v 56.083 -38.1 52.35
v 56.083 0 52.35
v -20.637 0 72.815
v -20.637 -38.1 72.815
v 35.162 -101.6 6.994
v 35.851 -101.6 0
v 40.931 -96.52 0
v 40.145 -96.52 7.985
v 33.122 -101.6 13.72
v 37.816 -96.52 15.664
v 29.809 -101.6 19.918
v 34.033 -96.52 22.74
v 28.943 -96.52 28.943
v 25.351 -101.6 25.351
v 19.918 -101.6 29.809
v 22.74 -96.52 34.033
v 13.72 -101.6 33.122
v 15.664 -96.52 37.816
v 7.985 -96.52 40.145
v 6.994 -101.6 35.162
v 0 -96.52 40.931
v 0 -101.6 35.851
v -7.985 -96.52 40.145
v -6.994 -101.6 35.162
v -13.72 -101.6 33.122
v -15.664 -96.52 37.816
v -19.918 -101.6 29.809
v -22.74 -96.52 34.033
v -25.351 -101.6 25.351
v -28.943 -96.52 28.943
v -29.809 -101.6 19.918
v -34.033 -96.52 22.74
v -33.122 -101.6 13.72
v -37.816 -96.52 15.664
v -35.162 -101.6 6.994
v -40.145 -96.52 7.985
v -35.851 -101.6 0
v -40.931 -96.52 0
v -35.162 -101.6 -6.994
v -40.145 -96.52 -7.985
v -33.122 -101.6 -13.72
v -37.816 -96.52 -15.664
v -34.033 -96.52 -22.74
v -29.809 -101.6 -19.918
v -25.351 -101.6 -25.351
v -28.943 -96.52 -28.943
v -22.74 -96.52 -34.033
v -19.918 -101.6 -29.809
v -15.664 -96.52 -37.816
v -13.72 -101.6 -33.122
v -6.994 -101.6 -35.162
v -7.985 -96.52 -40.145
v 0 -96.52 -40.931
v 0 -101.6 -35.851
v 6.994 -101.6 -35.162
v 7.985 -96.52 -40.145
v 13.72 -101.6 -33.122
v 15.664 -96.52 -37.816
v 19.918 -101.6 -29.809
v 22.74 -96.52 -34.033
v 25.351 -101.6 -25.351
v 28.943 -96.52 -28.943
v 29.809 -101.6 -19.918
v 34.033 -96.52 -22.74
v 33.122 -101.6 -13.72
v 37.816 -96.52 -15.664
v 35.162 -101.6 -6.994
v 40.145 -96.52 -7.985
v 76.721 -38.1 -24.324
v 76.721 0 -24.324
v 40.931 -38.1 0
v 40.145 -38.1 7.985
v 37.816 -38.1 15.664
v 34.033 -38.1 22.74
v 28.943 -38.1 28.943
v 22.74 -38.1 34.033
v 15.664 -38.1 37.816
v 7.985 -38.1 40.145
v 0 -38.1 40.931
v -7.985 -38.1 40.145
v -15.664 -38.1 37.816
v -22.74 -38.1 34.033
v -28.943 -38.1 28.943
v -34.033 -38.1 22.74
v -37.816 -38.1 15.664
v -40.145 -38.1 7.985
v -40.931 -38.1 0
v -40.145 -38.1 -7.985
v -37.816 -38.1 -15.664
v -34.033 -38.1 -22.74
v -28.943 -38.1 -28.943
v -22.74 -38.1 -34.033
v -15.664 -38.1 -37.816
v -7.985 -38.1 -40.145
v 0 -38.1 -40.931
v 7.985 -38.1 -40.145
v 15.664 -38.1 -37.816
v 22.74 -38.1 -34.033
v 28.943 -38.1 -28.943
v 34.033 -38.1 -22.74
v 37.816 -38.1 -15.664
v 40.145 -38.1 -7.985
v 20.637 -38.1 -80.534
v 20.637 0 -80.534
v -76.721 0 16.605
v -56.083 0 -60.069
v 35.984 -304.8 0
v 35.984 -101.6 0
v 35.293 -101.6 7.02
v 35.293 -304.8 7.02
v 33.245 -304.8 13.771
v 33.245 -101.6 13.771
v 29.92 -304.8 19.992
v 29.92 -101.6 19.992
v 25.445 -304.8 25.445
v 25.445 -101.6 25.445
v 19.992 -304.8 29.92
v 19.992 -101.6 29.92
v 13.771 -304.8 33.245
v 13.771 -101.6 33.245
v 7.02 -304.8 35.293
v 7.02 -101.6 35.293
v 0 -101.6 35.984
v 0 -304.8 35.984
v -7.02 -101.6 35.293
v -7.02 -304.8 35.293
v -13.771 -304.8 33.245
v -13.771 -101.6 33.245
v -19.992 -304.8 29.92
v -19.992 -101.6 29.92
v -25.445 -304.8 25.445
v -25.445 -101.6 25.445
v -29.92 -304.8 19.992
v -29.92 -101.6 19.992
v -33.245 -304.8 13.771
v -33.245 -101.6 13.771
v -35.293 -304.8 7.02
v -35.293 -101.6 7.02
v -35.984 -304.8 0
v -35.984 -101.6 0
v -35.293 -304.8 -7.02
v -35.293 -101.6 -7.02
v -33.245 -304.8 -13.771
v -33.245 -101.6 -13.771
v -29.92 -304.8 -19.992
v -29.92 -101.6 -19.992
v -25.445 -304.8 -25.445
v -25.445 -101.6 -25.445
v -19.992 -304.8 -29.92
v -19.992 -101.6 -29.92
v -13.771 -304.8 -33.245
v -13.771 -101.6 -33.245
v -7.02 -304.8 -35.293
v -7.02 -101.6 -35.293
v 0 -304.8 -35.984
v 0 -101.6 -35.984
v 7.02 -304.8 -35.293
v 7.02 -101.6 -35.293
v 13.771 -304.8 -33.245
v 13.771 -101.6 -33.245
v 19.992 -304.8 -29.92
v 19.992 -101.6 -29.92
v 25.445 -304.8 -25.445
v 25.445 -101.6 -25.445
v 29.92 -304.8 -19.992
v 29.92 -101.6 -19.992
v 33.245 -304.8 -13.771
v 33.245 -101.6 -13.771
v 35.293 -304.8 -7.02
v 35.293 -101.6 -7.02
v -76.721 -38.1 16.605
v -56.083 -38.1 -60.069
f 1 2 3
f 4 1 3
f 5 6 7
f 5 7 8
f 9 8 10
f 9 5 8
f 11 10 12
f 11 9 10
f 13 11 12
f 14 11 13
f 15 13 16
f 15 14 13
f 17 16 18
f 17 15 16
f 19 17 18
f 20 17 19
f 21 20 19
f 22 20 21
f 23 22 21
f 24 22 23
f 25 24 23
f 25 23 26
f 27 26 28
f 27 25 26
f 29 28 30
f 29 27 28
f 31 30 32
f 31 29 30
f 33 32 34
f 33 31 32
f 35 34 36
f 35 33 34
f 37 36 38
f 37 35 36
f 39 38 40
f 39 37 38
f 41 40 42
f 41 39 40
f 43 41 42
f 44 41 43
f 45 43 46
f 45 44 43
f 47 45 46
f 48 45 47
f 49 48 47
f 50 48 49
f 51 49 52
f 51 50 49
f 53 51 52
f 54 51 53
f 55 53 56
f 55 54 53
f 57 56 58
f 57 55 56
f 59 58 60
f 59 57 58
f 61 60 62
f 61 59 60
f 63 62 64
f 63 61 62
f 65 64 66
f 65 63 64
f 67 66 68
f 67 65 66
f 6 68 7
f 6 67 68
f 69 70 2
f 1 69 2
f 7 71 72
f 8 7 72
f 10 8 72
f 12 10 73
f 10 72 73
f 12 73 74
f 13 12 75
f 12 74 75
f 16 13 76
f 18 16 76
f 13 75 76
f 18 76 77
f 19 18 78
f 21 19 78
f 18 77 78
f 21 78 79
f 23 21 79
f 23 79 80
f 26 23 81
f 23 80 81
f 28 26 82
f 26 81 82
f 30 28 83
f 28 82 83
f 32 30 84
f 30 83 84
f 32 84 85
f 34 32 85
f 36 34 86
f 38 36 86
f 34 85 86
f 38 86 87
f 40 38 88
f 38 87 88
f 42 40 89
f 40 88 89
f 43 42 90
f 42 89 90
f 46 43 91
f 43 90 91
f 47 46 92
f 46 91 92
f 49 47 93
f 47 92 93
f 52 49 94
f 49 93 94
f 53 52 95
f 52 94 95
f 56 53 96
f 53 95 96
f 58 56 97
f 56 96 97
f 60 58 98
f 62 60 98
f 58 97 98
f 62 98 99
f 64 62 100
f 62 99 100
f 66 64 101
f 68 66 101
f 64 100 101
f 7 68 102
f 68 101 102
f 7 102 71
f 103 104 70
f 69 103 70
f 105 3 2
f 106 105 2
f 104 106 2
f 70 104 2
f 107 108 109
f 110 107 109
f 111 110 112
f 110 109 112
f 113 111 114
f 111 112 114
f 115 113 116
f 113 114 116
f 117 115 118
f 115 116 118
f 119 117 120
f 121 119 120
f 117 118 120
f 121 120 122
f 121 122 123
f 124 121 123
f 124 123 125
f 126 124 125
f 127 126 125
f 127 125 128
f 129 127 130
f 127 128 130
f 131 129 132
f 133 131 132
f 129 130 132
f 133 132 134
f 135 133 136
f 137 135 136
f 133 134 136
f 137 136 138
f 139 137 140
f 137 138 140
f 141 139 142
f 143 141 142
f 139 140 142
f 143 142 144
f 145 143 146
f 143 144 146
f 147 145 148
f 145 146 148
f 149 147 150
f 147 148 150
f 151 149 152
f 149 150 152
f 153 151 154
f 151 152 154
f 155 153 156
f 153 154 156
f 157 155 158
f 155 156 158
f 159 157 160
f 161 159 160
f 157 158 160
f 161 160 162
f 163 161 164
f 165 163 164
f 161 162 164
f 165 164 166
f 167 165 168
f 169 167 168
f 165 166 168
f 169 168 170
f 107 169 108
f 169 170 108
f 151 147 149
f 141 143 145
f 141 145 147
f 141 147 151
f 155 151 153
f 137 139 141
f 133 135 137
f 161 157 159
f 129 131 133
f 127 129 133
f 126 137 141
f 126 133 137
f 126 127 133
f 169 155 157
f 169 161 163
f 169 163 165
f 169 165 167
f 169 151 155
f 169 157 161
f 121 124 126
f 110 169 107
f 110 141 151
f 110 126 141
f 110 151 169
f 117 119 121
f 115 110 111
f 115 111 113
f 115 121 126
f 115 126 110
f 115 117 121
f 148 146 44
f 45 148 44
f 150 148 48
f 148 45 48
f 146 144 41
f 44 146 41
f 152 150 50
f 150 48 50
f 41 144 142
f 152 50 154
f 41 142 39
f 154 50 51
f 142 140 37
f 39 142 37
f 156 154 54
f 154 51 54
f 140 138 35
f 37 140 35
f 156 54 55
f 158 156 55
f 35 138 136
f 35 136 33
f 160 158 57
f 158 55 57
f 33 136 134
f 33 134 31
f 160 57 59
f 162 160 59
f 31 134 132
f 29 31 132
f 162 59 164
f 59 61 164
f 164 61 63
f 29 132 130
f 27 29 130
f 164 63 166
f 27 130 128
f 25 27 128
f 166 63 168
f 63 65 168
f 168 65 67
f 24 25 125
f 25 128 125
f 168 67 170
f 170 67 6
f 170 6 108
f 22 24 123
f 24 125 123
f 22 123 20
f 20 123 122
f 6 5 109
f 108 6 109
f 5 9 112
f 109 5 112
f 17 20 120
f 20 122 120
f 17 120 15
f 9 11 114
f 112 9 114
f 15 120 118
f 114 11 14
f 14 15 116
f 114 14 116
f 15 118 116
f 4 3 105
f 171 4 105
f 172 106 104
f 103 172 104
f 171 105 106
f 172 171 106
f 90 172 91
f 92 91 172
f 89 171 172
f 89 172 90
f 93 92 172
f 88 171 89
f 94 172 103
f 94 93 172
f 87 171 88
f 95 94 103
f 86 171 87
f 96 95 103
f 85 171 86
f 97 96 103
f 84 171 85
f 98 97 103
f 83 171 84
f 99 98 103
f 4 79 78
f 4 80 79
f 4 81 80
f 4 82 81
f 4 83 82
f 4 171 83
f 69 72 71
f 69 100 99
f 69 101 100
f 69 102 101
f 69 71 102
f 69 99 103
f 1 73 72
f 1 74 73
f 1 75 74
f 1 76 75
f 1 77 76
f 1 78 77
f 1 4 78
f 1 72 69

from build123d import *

# Parameters (mm, degrees)
F1_DEPTH = 38.1
F2_R     = 40.931298
F3_DEPTH = 63.5
F4_SIZE  = 5.08
F5_R     = 35.9841
F6_DEPTH = 203.2


with BuildPart() as f1:
    # F0 (on Front) → F1 (new body)
    with BuildSketch(Plane.XZ):
        Polygon((76.720704, -24.324451), (56.083392, 52.35003), (-20.637312, 72.814834), (-76.720704, 16.605157), (-56.083392, -60.069323), (20.637312, -80.534127), align=None)
    extrude(amount=F1_DEPTH)

    # F2 (on face) → F3 (join)
    with BuildSketch(Plane.XZ.offset(38.1)):
        Circle(F2_R)
    extrude(amount=F3_DEPTH)

    # F4
    f4_edges = [f1.edges().sort_by_distance(p)[0] for p in [
        (-40.931298, -101.6, 0),
    ]]
    chamfer(f4_edges, length=F4_SIZE)

    # F5 (on face) → F6 (join)
    with BuildSketch(Plane.XZ.offset(101.6)):
        Circle(F5_R)
    extrude(amount=F6_DEPTH)


solid = f1.part
